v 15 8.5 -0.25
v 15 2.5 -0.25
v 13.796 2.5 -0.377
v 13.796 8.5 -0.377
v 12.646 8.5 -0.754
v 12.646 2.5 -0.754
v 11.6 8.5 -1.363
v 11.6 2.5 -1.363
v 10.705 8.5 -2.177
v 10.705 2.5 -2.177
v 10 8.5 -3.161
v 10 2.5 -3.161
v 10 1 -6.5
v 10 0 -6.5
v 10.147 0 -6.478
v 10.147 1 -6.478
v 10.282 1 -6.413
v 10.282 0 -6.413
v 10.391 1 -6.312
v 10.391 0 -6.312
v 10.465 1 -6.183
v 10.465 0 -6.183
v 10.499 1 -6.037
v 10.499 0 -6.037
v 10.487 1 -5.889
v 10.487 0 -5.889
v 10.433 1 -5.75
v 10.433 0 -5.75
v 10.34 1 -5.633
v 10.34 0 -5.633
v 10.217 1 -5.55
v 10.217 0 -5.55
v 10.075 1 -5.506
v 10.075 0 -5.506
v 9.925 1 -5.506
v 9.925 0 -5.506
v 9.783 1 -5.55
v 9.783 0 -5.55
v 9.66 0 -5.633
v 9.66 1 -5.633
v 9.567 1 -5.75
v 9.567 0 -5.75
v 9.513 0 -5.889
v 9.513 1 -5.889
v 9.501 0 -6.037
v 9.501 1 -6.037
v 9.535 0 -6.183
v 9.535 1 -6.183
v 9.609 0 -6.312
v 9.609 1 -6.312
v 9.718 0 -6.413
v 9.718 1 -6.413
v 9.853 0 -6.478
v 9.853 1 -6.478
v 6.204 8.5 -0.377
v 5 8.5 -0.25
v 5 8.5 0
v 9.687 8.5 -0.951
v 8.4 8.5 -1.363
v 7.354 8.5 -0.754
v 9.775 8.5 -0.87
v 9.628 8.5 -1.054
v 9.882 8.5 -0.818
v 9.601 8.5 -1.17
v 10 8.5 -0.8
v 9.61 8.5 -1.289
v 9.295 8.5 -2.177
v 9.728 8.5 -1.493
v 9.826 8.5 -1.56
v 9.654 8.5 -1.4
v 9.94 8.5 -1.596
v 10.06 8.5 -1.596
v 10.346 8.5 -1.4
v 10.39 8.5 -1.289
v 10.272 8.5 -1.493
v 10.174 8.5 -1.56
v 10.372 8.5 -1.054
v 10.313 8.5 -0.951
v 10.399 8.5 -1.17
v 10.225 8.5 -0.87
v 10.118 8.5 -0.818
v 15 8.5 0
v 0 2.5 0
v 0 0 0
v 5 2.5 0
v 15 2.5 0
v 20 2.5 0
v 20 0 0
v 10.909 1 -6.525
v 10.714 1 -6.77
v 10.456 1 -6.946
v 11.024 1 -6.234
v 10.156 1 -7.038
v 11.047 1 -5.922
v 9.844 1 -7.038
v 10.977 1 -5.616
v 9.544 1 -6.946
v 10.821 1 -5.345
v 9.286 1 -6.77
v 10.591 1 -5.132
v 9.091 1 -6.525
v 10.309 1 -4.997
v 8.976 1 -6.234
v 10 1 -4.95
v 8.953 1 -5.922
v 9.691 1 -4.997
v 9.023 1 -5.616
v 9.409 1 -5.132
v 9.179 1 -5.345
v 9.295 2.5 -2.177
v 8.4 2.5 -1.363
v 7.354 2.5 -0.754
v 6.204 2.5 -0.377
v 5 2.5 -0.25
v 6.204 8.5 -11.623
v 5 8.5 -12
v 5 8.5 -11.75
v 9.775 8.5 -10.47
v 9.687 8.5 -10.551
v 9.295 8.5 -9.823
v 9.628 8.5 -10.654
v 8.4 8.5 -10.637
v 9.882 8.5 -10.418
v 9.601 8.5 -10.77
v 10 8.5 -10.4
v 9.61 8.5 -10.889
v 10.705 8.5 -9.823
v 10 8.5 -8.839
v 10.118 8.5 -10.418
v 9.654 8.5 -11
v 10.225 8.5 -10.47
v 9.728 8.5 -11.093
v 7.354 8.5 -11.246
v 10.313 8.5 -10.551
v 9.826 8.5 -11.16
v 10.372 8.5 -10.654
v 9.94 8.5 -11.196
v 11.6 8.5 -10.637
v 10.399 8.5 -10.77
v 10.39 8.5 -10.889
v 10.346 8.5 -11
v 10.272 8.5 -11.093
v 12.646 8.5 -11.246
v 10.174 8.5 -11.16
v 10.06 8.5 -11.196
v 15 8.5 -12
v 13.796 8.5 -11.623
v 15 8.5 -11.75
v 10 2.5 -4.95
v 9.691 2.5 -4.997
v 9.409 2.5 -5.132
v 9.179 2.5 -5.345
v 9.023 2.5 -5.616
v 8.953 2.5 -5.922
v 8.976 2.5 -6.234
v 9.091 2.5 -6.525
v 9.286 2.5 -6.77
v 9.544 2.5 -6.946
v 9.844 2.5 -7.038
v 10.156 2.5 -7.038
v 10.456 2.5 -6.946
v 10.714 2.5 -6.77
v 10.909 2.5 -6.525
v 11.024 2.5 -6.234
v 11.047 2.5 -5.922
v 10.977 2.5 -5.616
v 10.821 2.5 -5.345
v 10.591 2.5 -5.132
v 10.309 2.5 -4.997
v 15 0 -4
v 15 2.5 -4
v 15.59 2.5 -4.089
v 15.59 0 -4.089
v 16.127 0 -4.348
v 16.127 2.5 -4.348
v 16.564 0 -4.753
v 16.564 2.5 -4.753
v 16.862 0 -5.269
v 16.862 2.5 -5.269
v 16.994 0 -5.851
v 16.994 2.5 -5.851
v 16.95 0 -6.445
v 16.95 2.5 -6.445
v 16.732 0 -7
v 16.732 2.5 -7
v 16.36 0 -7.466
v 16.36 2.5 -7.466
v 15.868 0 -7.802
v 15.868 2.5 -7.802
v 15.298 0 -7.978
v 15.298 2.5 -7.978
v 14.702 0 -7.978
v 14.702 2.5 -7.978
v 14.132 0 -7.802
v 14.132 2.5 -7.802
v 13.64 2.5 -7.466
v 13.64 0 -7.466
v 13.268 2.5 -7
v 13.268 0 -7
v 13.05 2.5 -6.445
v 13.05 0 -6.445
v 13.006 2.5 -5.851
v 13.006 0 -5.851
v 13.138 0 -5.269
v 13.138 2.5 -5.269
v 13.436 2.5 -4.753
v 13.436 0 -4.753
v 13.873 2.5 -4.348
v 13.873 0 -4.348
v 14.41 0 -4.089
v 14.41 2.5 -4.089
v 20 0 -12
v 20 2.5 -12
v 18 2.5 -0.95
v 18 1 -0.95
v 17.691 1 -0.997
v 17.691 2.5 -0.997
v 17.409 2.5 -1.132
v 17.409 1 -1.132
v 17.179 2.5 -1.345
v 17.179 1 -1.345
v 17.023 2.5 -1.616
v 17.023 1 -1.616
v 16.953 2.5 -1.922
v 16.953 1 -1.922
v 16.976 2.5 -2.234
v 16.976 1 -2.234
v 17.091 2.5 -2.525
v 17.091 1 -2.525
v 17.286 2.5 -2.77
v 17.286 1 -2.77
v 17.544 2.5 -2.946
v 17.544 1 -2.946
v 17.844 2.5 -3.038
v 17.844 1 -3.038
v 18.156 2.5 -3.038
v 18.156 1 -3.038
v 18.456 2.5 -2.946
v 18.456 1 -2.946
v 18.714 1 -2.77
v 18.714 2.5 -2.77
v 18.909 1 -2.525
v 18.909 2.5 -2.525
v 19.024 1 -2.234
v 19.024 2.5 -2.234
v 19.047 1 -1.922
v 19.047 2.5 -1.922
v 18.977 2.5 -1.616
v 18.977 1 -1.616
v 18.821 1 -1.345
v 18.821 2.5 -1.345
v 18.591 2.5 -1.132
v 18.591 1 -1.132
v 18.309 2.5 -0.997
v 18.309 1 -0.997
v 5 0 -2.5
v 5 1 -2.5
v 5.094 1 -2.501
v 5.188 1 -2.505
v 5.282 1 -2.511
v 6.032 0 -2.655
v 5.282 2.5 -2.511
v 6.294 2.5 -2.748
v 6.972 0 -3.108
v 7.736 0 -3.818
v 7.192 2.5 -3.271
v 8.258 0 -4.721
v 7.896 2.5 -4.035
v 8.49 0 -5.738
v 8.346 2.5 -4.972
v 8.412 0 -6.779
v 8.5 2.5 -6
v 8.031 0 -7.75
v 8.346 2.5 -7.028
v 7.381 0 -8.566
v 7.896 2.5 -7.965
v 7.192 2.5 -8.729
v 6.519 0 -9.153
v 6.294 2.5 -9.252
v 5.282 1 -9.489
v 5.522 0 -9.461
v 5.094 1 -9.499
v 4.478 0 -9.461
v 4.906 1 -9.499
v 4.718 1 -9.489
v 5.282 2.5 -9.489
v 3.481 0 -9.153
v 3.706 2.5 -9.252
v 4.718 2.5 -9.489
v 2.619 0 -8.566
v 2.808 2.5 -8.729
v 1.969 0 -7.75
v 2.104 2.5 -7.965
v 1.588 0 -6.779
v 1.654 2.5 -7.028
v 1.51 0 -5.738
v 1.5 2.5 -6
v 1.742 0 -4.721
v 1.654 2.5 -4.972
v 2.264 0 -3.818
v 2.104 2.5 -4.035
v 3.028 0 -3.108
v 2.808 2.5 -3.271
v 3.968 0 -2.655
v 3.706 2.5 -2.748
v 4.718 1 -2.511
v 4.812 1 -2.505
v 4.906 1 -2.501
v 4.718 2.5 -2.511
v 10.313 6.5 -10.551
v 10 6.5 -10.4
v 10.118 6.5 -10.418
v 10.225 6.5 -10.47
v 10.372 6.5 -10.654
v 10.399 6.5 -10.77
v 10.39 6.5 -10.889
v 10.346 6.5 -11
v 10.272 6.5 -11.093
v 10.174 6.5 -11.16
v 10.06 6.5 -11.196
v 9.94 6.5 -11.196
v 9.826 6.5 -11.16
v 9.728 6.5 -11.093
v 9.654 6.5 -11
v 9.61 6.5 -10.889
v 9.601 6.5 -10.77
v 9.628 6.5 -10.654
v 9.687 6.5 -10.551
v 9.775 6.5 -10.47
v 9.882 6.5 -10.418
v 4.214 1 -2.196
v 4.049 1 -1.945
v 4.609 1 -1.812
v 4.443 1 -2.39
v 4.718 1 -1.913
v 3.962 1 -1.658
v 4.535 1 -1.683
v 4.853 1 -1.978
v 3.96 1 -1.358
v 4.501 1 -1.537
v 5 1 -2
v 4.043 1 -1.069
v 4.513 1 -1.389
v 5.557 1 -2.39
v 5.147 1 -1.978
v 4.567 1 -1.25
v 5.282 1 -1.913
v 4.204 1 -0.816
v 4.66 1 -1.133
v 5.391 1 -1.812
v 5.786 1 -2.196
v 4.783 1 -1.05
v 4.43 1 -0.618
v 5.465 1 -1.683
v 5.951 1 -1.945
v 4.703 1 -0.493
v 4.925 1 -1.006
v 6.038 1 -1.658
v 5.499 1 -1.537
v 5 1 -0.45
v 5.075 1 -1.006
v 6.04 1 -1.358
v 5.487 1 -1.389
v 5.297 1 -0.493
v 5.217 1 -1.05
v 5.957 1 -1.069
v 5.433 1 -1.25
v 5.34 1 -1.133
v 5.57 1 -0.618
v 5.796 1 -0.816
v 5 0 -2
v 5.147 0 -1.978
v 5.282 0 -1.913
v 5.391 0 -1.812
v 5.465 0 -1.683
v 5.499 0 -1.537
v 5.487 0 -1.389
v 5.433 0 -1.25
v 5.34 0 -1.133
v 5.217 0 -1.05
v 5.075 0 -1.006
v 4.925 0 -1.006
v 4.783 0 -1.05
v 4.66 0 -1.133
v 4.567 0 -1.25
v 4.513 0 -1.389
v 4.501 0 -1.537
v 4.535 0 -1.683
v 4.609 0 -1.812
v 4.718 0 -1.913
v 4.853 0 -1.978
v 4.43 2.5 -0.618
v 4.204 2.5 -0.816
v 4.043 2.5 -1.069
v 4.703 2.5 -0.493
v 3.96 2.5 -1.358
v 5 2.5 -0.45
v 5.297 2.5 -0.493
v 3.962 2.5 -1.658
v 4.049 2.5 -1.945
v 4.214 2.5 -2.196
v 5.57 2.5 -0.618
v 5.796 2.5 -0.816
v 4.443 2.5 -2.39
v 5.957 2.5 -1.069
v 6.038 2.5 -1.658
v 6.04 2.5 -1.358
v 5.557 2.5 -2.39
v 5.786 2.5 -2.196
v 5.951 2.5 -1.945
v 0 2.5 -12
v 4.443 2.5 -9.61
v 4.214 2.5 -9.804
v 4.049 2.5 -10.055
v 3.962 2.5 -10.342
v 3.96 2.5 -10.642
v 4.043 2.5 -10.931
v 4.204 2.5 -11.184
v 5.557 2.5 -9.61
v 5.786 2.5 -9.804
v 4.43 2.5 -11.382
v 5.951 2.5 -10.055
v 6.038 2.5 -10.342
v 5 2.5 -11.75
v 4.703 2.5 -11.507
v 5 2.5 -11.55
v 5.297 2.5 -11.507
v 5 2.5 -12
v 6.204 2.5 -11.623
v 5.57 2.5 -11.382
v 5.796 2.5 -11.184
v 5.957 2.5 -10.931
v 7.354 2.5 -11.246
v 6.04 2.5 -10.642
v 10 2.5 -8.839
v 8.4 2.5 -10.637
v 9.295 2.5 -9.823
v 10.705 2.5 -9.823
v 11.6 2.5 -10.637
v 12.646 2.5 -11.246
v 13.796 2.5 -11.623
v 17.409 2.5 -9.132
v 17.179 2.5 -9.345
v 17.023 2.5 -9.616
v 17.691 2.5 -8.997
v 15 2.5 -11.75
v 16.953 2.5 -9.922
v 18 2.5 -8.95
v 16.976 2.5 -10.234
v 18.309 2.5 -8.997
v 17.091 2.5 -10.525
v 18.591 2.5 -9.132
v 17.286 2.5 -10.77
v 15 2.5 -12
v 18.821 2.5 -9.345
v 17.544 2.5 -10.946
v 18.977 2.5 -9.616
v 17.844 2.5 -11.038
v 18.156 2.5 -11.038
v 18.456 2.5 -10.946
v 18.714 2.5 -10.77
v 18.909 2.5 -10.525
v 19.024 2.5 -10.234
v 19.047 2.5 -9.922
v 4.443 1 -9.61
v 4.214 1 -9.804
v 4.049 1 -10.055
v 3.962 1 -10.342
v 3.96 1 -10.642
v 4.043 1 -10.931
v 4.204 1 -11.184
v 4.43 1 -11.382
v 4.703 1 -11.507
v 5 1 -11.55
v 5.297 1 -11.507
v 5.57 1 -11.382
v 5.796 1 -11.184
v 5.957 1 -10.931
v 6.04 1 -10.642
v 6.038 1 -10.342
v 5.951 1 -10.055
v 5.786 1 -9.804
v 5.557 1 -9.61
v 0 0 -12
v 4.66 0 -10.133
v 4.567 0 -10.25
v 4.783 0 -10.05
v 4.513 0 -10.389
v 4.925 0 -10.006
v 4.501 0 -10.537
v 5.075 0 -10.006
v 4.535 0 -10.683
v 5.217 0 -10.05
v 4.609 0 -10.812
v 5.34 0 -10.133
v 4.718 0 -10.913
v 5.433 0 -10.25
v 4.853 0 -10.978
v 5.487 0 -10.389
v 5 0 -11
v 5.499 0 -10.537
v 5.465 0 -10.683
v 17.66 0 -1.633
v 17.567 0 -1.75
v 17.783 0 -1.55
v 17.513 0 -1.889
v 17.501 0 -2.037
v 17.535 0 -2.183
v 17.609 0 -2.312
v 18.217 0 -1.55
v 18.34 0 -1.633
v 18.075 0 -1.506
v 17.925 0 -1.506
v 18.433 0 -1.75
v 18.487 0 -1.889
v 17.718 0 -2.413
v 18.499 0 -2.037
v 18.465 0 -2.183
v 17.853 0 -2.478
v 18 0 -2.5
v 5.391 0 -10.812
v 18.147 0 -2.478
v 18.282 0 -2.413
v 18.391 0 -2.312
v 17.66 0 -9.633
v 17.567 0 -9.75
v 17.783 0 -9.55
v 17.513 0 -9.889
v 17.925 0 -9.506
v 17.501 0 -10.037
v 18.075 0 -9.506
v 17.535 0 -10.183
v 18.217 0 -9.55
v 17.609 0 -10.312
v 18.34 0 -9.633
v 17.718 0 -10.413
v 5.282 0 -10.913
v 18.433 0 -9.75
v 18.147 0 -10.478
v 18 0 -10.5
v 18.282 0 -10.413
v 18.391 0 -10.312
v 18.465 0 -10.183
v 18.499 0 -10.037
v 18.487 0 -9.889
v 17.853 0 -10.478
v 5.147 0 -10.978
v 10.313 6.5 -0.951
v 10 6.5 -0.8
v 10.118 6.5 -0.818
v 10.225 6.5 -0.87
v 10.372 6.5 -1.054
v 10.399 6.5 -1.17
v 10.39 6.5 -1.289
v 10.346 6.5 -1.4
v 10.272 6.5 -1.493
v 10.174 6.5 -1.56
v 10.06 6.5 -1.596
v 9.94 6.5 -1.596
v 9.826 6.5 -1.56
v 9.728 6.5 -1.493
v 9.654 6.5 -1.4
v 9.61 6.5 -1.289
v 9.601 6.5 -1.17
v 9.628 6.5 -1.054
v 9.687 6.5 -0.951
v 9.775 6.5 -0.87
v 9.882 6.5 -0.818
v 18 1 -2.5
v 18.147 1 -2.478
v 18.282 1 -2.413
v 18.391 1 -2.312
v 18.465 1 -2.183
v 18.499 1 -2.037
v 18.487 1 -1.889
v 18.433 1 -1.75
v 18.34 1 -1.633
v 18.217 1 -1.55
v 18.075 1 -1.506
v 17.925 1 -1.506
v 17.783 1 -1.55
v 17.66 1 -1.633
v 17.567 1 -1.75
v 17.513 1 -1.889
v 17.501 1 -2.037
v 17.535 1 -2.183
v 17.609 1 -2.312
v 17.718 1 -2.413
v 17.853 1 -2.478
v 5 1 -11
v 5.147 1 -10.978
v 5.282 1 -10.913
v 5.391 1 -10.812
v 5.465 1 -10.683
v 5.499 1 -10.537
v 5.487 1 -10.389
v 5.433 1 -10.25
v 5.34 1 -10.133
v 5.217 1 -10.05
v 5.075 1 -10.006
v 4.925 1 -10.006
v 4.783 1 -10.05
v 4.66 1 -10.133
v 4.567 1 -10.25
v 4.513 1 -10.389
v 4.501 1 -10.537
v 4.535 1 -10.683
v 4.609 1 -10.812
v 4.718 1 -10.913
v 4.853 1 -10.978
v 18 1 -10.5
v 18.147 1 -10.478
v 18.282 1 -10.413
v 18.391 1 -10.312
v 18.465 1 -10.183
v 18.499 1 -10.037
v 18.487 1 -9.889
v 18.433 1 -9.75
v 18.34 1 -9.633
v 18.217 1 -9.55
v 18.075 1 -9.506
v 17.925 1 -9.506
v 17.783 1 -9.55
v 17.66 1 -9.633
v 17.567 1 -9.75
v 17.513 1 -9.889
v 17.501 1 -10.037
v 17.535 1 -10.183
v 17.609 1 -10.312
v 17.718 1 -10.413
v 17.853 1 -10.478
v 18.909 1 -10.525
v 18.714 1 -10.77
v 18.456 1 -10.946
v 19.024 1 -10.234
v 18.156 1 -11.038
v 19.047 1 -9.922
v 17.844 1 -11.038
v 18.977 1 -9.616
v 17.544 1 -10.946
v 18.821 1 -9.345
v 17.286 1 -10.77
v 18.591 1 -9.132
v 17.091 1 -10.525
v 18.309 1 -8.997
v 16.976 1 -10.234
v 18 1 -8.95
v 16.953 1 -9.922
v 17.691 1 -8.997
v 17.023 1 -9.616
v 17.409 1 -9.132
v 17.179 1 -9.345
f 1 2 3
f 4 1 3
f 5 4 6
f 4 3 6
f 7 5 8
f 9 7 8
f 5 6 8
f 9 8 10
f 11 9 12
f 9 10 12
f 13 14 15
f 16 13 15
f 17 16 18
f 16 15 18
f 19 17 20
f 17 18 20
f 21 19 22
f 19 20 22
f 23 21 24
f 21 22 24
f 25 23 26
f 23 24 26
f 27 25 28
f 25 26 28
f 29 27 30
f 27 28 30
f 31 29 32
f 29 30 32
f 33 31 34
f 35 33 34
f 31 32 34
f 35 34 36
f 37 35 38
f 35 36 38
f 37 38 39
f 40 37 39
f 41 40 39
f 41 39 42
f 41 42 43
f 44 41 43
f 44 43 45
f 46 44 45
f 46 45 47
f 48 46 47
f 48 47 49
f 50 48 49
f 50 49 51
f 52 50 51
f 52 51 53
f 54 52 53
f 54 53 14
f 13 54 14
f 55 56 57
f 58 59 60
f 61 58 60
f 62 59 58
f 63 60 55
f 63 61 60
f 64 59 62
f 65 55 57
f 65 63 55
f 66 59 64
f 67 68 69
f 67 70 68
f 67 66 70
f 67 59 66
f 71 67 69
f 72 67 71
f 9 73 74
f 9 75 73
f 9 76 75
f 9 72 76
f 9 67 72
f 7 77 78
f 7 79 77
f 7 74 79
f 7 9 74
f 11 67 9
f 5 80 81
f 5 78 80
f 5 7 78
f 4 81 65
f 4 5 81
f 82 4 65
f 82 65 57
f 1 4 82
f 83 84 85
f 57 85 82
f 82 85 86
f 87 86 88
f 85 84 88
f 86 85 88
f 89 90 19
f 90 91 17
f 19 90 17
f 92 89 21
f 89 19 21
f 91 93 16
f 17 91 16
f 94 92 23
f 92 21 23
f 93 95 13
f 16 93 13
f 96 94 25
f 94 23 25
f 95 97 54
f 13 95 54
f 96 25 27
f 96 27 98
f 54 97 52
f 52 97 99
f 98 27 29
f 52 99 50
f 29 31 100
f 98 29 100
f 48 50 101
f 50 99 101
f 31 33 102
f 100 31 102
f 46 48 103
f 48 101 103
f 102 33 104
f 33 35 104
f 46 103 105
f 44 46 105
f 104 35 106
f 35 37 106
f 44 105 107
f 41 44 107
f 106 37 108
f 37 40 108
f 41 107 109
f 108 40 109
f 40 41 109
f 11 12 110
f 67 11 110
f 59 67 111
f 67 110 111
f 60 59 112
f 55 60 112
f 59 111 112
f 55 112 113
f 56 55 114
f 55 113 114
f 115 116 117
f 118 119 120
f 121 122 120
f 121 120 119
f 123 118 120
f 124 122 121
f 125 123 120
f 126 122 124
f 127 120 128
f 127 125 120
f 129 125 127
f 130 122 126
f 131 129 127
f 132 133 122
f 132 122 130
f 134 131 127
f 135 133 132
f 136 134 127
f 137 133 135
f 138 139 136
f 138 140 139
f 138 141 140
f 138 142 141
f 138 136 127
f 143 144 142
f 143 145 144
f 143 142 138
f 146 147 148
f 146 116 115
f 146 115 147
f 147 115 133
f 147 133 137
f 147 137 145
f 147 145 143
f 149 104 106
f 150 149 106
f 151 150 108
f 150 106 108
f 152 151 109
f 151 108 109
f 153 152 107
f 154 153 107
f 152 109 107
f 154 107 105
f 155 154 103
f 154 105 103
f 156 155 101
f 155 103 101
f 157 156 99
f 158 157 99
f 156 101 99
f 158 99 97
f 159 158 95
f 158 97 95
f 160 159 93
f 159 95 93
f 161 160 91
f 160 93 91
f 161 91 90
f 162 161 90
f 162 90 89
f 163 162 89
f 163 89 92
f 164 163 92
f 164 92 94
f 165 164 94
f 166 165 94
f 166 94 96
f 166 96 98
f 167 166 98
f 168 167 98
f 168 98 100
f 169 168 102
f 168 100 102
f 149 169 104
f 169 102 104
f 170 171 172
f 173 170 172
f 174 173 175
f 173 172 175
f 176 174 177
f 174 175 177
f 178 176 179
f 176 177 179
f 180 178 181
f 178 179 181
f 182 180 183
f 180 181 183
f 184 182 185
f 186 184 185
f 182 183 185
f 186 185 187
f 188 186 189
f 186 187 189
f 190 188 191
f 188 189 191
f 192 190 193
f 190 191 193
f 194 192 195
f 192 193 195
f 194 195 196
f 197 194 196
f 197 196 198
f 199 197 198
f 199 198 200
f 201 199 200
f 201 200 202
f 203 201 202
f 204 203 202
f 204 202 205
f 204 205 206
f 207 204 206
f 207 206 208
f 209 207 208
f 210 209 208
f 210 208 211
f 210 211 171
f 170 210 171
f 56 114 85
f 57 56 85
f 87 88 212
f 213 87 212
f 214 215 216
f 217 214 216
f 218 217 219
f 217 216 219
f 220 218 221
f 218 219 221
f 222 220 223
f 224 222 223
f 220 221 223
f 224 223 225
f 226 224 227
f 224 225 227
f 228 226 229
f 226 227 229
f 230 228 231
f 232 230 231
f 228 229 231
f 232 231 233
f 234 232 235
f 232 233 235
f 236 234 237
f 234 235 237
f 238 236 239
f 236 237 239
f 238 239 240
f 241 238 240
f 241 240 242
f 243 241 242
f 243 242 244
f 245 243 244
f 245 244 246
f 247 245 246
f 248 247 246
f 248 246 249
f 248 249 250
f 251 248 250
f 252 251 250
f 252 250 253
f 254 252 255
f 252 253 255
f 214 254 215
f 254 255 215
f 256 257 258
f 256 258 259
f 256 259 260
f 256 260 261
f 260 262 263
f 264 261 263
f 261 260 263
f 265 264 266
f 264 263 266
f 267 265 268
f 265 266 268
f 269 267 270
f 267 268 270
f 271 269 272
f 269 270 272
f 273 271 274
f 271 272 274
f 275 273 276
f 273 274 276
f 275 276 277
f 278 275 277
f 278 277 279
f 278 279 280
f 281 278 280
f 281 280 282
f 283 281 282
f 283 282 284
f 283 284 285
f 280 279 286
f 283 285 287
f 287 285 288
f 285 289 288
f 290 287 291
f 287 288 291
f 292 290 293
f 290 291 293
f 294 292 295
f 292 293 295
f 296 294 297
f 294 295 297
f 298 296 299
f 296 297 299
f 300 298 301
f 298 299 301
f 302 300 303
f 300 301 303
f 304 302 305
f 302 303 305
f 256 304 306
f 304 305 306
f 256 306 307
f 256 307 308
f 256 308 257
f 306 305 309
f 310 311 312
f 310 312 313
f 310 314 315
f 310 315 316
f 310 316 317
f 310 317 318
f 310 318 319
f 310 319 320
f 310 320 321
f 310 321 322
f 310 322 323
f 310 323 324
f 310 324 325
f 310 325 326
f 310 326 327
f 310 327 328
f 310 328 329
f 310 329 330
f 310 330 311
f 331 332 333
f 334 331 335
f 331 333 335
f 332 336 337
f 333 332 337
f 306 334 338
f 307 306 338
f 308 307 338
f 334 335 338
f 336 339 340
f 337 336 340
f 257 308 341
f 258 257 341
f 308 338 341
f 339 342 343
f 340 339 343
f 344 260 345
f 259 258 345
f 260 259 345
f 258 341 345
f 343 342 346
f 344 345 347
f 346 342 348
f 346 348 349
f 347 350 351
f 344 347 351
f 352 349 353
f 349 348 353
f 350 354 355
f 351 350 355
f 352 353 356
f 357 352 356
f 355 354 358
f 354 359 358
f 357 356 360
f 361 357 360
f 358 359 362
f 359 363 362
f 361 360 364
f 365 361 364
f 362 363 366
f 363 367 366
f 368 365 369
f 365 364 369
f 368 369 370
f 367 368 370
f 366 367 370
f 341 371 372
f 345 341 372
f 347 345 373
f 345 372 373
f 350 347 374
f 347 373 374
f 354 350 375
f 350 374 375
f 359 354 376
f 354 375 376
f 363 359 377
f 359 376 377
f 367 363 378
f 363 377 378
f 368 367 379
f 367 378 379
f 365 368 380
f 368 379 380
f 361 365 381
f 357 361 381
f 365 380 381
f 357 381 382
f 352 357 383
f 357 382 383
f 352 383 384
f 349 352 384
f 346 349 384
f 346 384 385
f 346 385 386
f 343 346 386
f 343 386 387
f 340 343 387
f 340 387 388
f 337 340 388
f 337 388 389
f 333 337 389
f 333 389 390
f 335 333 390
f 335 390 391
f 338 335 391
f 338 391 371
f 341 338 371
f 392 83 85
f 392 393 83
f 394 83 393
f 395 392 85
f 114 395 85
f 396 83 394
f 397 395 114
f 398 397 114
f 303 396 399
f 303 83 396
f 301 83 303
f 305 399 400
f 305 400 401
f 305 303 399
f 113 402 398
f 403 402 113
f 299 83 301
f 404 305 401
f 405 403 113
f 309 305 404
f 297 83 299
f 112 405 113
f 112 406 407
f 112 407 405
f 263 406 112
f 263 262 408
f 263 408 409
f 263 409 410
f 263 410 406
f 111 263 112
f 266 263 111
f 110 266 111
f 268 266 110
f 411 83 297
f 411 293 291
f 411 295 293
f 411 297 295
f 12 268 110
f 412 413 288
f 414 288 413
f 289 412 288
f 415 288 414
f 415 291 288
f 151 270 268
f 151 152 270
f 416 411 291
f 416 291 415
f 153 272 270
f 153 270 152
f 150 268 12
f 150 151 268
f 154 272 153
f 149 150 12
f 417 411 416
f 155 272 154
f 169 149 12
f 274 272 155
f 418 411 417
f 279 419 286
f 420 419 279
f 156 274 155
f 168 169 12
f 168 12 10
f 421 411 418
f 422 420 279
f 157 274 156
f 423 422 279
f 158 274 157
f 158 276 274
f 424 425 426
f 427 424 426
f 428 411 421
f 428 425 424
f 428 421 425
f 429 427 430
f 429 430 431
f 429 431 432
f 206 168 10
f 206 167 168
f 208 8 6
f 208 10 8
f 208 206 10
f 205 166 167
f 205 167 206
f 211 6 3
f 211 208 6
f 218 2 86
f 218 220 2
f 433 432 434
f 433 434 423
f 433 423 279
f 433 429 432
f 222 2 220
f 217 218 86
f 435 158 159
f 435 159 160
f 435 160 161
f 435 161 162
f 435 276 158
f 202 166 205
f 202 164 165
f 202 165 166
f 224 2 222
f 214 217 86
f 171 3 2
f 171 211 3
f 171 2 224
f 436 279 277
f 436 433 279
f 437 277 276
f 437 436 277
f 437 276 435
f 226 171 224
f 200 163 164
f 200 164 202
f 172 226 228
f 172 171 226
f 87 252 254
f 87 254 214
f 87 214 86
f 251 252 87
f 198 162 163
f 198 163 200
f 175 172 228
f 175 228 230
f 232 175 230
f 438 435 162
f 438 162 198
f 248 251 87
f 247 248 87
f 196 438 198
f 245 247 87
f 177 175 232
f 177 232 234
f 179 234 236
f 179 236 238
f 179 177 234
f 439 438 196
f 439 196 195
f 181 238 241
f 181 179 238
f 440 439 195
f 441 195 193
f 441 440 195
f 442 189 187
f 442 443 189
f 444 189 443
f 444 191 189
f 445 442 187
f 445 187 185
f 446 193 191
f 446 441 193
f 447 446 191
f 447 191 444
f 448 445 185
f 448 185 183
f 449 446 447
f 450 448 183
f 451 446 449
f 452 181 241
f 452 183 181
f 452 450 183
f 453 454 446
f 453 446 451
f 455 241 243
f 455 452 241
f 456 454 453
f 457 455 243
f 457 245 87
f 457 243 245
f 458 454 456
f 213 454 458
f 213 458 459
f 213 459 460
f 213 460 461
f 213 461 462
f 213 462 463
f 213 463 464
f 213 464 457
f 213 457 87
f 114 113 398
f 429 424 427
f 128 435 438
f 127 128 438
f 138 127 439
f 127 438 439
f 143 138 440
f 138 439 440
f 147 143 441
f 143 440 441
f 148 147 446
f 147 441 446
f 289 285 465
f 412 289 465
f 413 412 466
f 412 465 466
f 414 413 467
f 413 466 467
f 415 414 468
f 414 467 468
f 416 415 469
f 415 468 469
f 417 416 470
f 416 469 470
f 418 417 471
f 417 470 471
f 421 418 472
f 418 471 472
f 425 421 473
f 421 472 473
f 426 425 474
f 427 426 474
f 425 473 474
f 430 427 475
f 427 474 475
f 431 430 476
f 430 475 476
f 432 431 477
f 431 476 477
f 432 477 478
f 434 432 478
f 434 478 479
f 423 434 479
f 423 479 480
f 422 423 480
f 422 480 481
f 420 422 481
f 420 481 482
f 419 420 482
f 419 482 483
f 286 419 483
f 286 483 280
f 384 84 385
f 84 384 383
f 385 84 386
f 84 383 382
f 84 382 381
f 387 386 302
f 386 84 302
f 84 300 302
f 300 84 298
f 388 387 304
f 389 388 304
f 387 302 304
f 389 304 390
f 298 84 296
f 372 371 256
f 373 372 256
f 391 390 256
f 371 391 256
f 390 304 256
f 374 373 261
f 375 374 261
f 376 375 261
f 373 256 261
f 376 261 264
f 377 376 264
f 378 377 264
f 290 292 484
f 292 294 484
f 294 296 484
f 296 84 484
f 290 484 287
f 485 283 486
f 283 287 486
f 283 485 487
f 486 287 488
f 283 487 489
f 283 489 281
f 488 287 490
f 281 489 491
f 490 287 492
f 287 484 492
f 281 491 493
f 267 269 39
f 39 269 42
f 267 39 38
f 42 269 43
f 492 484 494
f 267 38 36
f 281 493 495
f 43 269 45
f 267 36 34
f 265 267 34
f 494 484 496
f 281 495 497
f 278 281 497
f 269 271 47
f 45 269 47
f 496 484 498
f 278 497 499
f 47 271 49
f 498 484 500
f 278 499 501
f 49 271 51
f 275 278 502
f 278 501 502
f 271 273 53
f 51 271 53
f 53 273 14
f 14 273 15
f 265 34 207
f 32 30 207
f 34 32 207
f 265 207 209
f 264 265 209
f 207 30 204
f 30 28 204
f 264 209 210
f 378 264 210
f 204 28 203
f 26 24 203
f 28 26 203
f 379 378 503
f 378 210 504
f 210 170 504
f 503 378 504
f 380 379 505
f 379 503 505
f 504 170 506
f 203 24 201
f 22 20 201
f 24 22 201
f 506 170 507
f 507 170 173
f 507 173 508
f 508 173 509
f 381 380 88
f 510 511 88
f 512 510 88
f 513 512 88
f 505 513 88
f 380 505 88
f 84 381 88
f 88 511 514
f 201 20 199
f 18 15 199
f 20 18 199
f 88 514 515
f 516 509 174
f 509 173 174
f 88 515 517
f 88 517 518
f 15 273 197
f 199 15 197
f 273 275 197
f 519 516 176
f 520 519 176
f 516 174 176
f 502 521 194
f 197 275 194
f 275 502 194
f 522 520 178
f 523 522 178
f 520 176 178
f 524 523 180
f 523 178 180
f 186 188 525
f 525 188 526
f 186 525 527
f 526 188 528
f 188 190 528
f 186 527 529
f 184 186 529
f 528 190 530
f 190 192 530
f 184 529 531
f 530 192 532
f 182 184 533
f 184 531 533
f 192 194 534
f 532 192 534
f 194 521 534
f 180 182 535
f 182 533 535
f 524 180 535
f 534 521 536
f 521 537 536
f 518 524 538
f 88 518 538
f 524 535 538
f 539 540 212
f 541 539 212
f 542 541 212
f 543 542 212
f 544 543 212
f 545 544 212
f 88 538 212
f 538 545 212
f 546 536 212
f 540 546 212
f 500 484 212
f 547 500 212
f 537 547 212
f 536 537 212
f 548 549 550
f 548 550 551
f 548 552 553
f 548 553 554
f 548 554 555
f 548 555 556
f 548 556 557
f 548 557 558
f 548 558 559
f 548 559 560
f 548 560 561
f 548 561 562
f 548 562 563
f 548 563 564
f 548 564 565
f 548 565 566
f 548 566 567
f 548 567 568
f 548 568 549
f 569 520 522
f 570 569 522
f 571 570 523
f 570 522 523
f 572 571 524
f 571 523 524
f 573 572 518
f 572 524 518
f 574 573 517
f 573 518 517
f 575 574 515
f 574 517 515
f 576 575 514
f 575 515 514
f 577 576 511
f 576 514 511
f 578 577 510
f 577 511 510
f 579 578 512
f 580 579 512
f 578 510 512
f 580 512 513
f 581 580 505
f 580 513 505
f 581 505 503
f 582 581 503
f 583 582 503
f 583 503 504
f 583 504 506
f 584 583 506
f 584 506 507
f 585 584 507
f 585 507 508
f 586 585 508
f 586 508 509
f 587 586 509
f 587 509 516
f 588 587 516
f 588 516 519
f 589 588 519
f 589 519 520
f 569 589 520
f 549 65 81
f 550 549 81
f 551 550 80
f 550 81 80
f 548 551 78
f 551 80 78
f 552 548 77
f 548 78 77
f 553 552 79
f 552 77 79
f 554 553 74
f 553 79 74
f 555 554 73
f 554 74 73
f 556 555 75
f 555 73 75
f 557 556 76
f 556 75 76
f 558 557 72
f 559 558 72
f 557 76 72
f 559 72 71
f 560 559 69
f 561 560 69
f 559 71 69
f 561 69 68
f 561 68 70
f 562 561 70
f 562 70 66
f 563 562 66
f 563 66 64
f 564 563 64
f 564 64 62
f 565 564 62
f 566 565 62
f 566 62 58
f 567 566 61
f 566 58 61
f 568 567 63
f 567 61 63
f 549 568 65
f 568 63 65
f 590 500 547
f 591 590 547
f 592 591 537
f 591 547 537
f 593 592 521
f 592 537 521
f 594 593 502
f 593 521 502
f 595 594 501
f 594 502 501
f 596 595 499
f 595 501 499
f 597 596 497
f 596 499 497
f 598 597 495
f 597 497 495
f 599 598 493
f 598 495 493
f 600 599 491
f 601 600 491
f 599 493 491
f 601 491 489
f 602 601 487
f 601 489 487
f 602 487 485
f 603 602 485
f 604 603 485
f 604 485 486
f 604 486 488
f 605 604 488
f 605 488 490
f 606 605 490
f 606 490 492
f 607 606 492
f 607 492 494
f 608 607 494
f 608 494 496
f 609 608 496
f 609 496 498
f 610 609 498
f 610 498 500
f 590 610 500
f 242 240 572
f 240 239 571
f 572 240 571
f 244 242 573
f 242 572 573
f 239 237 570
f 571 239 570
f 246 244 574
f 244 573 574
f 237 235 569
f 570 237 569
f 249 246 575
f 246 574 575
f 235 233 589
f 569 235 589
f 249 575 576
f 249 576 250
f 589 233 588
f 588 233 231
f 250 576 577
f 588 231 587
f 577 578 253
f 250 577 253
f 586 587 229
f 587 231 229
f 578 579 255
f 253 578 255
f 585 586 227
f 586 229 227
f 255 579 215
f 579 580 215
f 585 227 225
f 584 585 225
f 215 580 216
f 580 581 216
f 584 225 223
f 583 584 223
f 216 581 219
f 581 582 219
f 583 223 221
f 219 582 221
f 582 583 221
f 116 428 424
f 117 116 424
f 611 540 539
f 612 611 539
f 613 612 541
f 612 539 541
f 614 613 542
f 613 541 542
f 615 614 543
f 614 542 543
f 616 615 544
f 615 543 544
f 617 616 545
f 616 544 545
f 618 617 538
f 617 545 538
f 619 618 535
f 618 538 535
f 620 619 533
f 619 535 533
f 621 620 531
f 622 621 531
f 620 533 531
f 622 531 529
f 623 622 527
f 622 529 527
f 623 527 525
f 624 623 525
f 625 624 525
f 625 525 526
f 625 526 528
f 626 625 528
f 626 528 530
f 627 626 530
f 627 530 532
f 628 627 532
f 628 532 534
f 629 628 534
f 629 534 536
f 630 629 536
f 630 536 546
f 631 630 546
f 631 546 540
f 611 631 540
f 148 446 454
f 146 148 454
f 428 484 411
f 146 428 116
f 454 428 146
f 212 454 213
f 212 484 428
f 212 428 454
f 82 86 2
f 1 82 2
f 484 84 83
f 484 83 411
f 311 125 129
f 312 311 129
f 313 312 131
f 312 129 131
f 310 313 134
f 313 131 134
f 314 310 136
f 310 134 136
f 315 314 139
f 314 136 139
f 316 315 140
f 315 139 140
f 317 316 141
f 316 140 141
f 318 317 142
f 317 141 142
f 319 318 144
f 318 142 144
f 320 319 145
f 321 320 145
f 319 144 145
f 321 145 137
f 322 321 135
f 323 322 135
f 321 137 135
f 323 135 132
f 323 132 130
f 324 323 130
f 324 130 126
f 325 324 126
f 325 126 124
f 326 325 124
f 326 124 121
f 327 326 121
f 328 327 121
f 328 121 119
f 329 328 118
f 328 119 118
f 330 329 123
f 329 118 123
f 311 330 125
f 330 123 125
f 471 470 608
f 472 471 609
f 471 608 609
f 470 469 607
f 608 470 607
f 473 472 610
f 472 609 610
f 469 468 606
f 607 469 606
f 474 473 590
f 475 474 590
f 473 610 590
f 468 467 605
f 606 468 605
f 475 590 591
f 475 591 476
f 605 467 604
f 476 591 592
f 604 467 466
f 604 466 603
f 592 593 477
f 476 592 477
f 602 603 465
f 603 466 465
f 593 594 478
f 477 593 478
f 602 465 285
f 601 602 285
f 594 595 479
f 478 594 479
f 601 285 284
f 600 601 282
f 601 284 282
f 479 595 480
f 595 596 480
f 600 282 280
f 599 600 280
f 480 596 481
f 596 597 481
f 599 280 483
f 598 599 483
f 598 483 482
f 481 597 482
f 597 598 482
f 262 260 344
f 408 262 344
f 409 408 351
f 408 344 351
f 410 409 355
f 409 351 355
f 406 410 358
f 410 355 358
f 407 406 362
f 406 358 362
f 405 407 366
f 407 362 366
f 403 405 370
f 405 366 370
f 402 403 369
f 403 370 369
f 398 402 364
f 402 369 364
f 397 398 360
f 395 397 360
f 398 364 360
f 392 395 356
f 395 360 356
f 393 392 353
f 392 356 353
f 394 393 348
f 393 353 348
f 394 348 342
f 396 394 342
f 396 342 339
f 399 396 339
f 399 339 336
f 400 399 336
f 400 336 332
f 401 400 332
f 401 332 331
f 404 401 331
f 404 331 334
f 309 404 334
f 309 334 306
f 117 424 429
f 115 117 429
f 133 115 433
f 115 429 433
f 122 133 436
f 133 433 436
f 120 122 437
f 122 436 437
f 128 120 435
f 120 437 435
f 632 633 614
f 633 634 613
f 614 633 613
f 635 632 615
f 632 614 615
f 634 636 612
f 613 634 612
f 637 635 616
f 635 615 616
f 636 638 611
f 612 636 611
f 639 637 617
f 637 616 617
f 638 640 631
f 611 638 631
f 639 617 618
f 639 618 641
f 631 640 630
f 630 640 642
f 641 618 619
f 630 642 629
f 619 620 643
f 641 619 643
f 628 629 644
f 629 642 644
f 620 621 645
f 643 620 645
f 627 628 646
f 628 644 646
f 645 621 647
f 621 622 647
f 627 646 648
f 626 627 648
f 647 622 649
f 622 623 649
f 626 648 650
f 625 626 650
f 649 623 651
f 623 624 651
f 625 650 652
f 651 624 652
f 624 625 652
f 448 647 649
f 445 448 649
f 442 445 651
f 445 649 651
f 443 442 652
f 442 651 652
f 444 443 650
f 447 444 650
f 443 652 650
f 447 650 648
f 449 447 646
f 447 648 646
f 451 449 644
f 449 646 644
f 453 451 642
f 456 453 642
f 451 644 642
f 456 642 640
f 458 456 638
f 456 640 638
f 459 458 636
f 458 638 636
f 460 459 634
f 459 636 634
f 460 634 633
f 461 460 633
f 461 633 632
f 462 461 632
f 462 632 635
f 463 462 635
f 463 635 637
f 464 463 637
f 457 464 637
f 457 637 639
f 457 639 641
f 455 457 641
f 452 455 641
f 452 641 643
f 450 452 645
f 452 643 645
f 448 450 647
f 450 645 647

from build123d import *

# Parameters (mm, degrees)
SKETCH_1_W          = 20
SKETCH_1_H          = 12
EXTRUDE_1_DEPTH     = 2.5
SKETCH_2_R          = 2
SKETCH_2_R_2        = 3.5
CUT_EXTRUDE_1_DEPTH = 24.457408211
SKETCH_3_R          = 0.5
CUT_EXTRUDE_3_DEPTH = 24.457408211
CUT_EXTRUDE_START   = -1
SKETCH_3_4_R        = 1.05
SKETCH_3_4_R_2      = 0.5
CUT_EXTRUDE_6_DEPTH = 1.5
EXTRUDE_2_DEPTH     = 6
SKETCH_5_R          = 0.4
CUT_EXTRUDE_7_DEPTH = 2


with BuildPart() as part:
    # 草图1 → 凸台-拉伸1 (new body)
    with BuildSketch(Plane(origin=(0, 0, 0), x_dir=(1, 0, 0), z_dir=(0, 1, 0))):
        with Locations((10, 6)):
            Rectangle(SKETCH_1_W, SKETCH_1_H)
    extrude(amount=EXTRUDE_1_DEPTH)

    # 草图2 → 切除-拉伸1 (cut, through all)
    with BuildSketch(Plane(origin=(0, 2.5, 0), x_dir=(1, 0, 0), z_dir=(0, 1, 0))):
        with Locations(Location((15, 6, 0), (0, 0, 270))):
            Circle(SKETCH_2_R)
        with Locations(Location((5, 6, 0), (0, 0, 270))):
            Circle(SKETCH_2_R_2)
    extrude(amount=-CUT_EXTRUDE_1_DEPTH, mode=Mode.SUBTRACT)

    # 草图3 → 切除-拉伸3 (cut, through all)
    with BuildSketch(Plane.XZ):
        with Locations(Location((18, -2, 0), (0, 0, 270))):
            Circle(SKETCH_3_R)
        with Locations(Location((18, -10, 0), (0, 0, 270))):
            Circle(SKETCH_3_R)
        with Locations(Location((10, -6, 0), (0, 0, 270))):
            Circle(SKETCH_3_R)
        with Locations(Location((5, -1.5, 0), (0, 0, 270))):
            Circle(SKETCH_3_R)
        with Locations(Location((5, -10.5, 0), (0, 0, 270))):
            Circle(SKETCH_3_R)
    extrude(amount=-CUT_EXTRUDE_3_DEPTH, mode=Mode.SUBTRACT)

    # 草图3<4> → 切除-拉伸6 (cut)
    # profile 1 of 5: a face of its own
    with BuildSketch(Plane.XZ.offset(CUT_EXTRUDE_START)):
        with Locations((5, -10.5)):
            Circle(SKETCH_3_4_R)
        with Locations(Location((5, -10.5, 0), (0, 0, 270))):
            Circle(SKETCH_3_4_R_2, mode=Mode.SUBTRACT)
    # profile 2 of 5: a face of its own
    with BuildSketch(Plane.XZ.offset(CUT_EXTRUDE_START)):
        with Locations((5, -1.5)):
            Circle(SKETCH_3_4_R)
        with Locations(Location((5, -1.5, 0), (0, 0, 270))):
            Circle(SKETCH_3_4_R_2, mode=Mode.SUBTRACT)
    # profile 3 of 5: a face of its own
    with BuildSketch(Plane.XZ.offset(CUT_EXTRUDE_START)):
        with Locations(Location((18, -2, 0), (0, 0, 90))):
            Circle(SKETCH_3_4_R)
        with Locations(Location((18, -2, 0), (0, 0, 270))):
            Circle(SKETCH_3_4_R_2, mode=Mode.SUBTRACT)
    # profile 4 of 5: a face of its own
    with BuildSketch(Plane.XZ.offset(CUT_EXTRUDE_START)):
        with Locations(Location((10, -6, 0), (0, 0, 90))):
            Circle(SKETCH_3_4_R)
        with Locations(Location((10, -6, 0), (0, 0, 270))):
            Circle(SKETCH_3_4_R_2, mode=Mode.SUBTRACT)
    # profile 5 of 5: a face of its own
    with BuildSketch(Plane.XZ.offset(CUT_EXTRUDE_START)):
        with Locations(Location((18, -10, 0), (0, 0, 90))):
            Circle(SKETCH_3_4_R)
        with Locations(Location((18, -10, 0), (0, 0, 270))):
            Circle(SKETCH_3_4_R_2, mode=Mode.SUBTRACT)
    extrude(amount=-CUT_EXTRUDE_6_DEPTH, mode=Mode.SUBTRACT)

    # 草图4 → 凸台-拉伸2 (add)
    with BuildSketch(Plane(origin=(0, 2.5, 0), x_dir=(1, 0, 0), z_dir=(0, 1, 0))):
        with BuildLine():
            Line((15, 11.75), (15, 12))
            Line((15, 12), (5, 12))
            Line((5, 12), (5, 11.75))
            ThreePointArc((5, 11.75), (7.892718316, 10.969374281), (10, 8.839454173))
            ThreePointArc((10, 8.839454173), (12.107281684, 10.969374281), (15, 11.75))
        make_face()
        with BuildLine():
            Line((15, 0), (15, 0.25))
            ThreePointArc((15, 0.25), (12.107281684, 1.030625719), (10, 3.160545827))
            ThreePointArc((10, 3.160545827), (7.892718316, 1.030625719), (5, 0.25))
            Line((5, 0.25), (5, 0))
            Line((5, 0), (15, 0))
        make_face()
    extrude(amount=EXTRUDE_2_DEPTH)

    # 草图5 → 切除-拉伸7 (cut)
    with BuildSketch(Plane(origin=(0, 8.5, 0), x_dir=(1, 0, 0), z_dir=(0, 1, 0))):
        with Locations(Location((10, 1.2, 0), (0, 0, 270))):
            Circle(SKETCH_5_R)
        with Locations(Location((10, 10.8, 0), (0, 0, 270))):
            Circle(SKETCH_5_R)
    extrude(amount=-CUT_EXTRUDE_7_DEPTH, mode=Mode.SUBTRACT)


solid = part.part
